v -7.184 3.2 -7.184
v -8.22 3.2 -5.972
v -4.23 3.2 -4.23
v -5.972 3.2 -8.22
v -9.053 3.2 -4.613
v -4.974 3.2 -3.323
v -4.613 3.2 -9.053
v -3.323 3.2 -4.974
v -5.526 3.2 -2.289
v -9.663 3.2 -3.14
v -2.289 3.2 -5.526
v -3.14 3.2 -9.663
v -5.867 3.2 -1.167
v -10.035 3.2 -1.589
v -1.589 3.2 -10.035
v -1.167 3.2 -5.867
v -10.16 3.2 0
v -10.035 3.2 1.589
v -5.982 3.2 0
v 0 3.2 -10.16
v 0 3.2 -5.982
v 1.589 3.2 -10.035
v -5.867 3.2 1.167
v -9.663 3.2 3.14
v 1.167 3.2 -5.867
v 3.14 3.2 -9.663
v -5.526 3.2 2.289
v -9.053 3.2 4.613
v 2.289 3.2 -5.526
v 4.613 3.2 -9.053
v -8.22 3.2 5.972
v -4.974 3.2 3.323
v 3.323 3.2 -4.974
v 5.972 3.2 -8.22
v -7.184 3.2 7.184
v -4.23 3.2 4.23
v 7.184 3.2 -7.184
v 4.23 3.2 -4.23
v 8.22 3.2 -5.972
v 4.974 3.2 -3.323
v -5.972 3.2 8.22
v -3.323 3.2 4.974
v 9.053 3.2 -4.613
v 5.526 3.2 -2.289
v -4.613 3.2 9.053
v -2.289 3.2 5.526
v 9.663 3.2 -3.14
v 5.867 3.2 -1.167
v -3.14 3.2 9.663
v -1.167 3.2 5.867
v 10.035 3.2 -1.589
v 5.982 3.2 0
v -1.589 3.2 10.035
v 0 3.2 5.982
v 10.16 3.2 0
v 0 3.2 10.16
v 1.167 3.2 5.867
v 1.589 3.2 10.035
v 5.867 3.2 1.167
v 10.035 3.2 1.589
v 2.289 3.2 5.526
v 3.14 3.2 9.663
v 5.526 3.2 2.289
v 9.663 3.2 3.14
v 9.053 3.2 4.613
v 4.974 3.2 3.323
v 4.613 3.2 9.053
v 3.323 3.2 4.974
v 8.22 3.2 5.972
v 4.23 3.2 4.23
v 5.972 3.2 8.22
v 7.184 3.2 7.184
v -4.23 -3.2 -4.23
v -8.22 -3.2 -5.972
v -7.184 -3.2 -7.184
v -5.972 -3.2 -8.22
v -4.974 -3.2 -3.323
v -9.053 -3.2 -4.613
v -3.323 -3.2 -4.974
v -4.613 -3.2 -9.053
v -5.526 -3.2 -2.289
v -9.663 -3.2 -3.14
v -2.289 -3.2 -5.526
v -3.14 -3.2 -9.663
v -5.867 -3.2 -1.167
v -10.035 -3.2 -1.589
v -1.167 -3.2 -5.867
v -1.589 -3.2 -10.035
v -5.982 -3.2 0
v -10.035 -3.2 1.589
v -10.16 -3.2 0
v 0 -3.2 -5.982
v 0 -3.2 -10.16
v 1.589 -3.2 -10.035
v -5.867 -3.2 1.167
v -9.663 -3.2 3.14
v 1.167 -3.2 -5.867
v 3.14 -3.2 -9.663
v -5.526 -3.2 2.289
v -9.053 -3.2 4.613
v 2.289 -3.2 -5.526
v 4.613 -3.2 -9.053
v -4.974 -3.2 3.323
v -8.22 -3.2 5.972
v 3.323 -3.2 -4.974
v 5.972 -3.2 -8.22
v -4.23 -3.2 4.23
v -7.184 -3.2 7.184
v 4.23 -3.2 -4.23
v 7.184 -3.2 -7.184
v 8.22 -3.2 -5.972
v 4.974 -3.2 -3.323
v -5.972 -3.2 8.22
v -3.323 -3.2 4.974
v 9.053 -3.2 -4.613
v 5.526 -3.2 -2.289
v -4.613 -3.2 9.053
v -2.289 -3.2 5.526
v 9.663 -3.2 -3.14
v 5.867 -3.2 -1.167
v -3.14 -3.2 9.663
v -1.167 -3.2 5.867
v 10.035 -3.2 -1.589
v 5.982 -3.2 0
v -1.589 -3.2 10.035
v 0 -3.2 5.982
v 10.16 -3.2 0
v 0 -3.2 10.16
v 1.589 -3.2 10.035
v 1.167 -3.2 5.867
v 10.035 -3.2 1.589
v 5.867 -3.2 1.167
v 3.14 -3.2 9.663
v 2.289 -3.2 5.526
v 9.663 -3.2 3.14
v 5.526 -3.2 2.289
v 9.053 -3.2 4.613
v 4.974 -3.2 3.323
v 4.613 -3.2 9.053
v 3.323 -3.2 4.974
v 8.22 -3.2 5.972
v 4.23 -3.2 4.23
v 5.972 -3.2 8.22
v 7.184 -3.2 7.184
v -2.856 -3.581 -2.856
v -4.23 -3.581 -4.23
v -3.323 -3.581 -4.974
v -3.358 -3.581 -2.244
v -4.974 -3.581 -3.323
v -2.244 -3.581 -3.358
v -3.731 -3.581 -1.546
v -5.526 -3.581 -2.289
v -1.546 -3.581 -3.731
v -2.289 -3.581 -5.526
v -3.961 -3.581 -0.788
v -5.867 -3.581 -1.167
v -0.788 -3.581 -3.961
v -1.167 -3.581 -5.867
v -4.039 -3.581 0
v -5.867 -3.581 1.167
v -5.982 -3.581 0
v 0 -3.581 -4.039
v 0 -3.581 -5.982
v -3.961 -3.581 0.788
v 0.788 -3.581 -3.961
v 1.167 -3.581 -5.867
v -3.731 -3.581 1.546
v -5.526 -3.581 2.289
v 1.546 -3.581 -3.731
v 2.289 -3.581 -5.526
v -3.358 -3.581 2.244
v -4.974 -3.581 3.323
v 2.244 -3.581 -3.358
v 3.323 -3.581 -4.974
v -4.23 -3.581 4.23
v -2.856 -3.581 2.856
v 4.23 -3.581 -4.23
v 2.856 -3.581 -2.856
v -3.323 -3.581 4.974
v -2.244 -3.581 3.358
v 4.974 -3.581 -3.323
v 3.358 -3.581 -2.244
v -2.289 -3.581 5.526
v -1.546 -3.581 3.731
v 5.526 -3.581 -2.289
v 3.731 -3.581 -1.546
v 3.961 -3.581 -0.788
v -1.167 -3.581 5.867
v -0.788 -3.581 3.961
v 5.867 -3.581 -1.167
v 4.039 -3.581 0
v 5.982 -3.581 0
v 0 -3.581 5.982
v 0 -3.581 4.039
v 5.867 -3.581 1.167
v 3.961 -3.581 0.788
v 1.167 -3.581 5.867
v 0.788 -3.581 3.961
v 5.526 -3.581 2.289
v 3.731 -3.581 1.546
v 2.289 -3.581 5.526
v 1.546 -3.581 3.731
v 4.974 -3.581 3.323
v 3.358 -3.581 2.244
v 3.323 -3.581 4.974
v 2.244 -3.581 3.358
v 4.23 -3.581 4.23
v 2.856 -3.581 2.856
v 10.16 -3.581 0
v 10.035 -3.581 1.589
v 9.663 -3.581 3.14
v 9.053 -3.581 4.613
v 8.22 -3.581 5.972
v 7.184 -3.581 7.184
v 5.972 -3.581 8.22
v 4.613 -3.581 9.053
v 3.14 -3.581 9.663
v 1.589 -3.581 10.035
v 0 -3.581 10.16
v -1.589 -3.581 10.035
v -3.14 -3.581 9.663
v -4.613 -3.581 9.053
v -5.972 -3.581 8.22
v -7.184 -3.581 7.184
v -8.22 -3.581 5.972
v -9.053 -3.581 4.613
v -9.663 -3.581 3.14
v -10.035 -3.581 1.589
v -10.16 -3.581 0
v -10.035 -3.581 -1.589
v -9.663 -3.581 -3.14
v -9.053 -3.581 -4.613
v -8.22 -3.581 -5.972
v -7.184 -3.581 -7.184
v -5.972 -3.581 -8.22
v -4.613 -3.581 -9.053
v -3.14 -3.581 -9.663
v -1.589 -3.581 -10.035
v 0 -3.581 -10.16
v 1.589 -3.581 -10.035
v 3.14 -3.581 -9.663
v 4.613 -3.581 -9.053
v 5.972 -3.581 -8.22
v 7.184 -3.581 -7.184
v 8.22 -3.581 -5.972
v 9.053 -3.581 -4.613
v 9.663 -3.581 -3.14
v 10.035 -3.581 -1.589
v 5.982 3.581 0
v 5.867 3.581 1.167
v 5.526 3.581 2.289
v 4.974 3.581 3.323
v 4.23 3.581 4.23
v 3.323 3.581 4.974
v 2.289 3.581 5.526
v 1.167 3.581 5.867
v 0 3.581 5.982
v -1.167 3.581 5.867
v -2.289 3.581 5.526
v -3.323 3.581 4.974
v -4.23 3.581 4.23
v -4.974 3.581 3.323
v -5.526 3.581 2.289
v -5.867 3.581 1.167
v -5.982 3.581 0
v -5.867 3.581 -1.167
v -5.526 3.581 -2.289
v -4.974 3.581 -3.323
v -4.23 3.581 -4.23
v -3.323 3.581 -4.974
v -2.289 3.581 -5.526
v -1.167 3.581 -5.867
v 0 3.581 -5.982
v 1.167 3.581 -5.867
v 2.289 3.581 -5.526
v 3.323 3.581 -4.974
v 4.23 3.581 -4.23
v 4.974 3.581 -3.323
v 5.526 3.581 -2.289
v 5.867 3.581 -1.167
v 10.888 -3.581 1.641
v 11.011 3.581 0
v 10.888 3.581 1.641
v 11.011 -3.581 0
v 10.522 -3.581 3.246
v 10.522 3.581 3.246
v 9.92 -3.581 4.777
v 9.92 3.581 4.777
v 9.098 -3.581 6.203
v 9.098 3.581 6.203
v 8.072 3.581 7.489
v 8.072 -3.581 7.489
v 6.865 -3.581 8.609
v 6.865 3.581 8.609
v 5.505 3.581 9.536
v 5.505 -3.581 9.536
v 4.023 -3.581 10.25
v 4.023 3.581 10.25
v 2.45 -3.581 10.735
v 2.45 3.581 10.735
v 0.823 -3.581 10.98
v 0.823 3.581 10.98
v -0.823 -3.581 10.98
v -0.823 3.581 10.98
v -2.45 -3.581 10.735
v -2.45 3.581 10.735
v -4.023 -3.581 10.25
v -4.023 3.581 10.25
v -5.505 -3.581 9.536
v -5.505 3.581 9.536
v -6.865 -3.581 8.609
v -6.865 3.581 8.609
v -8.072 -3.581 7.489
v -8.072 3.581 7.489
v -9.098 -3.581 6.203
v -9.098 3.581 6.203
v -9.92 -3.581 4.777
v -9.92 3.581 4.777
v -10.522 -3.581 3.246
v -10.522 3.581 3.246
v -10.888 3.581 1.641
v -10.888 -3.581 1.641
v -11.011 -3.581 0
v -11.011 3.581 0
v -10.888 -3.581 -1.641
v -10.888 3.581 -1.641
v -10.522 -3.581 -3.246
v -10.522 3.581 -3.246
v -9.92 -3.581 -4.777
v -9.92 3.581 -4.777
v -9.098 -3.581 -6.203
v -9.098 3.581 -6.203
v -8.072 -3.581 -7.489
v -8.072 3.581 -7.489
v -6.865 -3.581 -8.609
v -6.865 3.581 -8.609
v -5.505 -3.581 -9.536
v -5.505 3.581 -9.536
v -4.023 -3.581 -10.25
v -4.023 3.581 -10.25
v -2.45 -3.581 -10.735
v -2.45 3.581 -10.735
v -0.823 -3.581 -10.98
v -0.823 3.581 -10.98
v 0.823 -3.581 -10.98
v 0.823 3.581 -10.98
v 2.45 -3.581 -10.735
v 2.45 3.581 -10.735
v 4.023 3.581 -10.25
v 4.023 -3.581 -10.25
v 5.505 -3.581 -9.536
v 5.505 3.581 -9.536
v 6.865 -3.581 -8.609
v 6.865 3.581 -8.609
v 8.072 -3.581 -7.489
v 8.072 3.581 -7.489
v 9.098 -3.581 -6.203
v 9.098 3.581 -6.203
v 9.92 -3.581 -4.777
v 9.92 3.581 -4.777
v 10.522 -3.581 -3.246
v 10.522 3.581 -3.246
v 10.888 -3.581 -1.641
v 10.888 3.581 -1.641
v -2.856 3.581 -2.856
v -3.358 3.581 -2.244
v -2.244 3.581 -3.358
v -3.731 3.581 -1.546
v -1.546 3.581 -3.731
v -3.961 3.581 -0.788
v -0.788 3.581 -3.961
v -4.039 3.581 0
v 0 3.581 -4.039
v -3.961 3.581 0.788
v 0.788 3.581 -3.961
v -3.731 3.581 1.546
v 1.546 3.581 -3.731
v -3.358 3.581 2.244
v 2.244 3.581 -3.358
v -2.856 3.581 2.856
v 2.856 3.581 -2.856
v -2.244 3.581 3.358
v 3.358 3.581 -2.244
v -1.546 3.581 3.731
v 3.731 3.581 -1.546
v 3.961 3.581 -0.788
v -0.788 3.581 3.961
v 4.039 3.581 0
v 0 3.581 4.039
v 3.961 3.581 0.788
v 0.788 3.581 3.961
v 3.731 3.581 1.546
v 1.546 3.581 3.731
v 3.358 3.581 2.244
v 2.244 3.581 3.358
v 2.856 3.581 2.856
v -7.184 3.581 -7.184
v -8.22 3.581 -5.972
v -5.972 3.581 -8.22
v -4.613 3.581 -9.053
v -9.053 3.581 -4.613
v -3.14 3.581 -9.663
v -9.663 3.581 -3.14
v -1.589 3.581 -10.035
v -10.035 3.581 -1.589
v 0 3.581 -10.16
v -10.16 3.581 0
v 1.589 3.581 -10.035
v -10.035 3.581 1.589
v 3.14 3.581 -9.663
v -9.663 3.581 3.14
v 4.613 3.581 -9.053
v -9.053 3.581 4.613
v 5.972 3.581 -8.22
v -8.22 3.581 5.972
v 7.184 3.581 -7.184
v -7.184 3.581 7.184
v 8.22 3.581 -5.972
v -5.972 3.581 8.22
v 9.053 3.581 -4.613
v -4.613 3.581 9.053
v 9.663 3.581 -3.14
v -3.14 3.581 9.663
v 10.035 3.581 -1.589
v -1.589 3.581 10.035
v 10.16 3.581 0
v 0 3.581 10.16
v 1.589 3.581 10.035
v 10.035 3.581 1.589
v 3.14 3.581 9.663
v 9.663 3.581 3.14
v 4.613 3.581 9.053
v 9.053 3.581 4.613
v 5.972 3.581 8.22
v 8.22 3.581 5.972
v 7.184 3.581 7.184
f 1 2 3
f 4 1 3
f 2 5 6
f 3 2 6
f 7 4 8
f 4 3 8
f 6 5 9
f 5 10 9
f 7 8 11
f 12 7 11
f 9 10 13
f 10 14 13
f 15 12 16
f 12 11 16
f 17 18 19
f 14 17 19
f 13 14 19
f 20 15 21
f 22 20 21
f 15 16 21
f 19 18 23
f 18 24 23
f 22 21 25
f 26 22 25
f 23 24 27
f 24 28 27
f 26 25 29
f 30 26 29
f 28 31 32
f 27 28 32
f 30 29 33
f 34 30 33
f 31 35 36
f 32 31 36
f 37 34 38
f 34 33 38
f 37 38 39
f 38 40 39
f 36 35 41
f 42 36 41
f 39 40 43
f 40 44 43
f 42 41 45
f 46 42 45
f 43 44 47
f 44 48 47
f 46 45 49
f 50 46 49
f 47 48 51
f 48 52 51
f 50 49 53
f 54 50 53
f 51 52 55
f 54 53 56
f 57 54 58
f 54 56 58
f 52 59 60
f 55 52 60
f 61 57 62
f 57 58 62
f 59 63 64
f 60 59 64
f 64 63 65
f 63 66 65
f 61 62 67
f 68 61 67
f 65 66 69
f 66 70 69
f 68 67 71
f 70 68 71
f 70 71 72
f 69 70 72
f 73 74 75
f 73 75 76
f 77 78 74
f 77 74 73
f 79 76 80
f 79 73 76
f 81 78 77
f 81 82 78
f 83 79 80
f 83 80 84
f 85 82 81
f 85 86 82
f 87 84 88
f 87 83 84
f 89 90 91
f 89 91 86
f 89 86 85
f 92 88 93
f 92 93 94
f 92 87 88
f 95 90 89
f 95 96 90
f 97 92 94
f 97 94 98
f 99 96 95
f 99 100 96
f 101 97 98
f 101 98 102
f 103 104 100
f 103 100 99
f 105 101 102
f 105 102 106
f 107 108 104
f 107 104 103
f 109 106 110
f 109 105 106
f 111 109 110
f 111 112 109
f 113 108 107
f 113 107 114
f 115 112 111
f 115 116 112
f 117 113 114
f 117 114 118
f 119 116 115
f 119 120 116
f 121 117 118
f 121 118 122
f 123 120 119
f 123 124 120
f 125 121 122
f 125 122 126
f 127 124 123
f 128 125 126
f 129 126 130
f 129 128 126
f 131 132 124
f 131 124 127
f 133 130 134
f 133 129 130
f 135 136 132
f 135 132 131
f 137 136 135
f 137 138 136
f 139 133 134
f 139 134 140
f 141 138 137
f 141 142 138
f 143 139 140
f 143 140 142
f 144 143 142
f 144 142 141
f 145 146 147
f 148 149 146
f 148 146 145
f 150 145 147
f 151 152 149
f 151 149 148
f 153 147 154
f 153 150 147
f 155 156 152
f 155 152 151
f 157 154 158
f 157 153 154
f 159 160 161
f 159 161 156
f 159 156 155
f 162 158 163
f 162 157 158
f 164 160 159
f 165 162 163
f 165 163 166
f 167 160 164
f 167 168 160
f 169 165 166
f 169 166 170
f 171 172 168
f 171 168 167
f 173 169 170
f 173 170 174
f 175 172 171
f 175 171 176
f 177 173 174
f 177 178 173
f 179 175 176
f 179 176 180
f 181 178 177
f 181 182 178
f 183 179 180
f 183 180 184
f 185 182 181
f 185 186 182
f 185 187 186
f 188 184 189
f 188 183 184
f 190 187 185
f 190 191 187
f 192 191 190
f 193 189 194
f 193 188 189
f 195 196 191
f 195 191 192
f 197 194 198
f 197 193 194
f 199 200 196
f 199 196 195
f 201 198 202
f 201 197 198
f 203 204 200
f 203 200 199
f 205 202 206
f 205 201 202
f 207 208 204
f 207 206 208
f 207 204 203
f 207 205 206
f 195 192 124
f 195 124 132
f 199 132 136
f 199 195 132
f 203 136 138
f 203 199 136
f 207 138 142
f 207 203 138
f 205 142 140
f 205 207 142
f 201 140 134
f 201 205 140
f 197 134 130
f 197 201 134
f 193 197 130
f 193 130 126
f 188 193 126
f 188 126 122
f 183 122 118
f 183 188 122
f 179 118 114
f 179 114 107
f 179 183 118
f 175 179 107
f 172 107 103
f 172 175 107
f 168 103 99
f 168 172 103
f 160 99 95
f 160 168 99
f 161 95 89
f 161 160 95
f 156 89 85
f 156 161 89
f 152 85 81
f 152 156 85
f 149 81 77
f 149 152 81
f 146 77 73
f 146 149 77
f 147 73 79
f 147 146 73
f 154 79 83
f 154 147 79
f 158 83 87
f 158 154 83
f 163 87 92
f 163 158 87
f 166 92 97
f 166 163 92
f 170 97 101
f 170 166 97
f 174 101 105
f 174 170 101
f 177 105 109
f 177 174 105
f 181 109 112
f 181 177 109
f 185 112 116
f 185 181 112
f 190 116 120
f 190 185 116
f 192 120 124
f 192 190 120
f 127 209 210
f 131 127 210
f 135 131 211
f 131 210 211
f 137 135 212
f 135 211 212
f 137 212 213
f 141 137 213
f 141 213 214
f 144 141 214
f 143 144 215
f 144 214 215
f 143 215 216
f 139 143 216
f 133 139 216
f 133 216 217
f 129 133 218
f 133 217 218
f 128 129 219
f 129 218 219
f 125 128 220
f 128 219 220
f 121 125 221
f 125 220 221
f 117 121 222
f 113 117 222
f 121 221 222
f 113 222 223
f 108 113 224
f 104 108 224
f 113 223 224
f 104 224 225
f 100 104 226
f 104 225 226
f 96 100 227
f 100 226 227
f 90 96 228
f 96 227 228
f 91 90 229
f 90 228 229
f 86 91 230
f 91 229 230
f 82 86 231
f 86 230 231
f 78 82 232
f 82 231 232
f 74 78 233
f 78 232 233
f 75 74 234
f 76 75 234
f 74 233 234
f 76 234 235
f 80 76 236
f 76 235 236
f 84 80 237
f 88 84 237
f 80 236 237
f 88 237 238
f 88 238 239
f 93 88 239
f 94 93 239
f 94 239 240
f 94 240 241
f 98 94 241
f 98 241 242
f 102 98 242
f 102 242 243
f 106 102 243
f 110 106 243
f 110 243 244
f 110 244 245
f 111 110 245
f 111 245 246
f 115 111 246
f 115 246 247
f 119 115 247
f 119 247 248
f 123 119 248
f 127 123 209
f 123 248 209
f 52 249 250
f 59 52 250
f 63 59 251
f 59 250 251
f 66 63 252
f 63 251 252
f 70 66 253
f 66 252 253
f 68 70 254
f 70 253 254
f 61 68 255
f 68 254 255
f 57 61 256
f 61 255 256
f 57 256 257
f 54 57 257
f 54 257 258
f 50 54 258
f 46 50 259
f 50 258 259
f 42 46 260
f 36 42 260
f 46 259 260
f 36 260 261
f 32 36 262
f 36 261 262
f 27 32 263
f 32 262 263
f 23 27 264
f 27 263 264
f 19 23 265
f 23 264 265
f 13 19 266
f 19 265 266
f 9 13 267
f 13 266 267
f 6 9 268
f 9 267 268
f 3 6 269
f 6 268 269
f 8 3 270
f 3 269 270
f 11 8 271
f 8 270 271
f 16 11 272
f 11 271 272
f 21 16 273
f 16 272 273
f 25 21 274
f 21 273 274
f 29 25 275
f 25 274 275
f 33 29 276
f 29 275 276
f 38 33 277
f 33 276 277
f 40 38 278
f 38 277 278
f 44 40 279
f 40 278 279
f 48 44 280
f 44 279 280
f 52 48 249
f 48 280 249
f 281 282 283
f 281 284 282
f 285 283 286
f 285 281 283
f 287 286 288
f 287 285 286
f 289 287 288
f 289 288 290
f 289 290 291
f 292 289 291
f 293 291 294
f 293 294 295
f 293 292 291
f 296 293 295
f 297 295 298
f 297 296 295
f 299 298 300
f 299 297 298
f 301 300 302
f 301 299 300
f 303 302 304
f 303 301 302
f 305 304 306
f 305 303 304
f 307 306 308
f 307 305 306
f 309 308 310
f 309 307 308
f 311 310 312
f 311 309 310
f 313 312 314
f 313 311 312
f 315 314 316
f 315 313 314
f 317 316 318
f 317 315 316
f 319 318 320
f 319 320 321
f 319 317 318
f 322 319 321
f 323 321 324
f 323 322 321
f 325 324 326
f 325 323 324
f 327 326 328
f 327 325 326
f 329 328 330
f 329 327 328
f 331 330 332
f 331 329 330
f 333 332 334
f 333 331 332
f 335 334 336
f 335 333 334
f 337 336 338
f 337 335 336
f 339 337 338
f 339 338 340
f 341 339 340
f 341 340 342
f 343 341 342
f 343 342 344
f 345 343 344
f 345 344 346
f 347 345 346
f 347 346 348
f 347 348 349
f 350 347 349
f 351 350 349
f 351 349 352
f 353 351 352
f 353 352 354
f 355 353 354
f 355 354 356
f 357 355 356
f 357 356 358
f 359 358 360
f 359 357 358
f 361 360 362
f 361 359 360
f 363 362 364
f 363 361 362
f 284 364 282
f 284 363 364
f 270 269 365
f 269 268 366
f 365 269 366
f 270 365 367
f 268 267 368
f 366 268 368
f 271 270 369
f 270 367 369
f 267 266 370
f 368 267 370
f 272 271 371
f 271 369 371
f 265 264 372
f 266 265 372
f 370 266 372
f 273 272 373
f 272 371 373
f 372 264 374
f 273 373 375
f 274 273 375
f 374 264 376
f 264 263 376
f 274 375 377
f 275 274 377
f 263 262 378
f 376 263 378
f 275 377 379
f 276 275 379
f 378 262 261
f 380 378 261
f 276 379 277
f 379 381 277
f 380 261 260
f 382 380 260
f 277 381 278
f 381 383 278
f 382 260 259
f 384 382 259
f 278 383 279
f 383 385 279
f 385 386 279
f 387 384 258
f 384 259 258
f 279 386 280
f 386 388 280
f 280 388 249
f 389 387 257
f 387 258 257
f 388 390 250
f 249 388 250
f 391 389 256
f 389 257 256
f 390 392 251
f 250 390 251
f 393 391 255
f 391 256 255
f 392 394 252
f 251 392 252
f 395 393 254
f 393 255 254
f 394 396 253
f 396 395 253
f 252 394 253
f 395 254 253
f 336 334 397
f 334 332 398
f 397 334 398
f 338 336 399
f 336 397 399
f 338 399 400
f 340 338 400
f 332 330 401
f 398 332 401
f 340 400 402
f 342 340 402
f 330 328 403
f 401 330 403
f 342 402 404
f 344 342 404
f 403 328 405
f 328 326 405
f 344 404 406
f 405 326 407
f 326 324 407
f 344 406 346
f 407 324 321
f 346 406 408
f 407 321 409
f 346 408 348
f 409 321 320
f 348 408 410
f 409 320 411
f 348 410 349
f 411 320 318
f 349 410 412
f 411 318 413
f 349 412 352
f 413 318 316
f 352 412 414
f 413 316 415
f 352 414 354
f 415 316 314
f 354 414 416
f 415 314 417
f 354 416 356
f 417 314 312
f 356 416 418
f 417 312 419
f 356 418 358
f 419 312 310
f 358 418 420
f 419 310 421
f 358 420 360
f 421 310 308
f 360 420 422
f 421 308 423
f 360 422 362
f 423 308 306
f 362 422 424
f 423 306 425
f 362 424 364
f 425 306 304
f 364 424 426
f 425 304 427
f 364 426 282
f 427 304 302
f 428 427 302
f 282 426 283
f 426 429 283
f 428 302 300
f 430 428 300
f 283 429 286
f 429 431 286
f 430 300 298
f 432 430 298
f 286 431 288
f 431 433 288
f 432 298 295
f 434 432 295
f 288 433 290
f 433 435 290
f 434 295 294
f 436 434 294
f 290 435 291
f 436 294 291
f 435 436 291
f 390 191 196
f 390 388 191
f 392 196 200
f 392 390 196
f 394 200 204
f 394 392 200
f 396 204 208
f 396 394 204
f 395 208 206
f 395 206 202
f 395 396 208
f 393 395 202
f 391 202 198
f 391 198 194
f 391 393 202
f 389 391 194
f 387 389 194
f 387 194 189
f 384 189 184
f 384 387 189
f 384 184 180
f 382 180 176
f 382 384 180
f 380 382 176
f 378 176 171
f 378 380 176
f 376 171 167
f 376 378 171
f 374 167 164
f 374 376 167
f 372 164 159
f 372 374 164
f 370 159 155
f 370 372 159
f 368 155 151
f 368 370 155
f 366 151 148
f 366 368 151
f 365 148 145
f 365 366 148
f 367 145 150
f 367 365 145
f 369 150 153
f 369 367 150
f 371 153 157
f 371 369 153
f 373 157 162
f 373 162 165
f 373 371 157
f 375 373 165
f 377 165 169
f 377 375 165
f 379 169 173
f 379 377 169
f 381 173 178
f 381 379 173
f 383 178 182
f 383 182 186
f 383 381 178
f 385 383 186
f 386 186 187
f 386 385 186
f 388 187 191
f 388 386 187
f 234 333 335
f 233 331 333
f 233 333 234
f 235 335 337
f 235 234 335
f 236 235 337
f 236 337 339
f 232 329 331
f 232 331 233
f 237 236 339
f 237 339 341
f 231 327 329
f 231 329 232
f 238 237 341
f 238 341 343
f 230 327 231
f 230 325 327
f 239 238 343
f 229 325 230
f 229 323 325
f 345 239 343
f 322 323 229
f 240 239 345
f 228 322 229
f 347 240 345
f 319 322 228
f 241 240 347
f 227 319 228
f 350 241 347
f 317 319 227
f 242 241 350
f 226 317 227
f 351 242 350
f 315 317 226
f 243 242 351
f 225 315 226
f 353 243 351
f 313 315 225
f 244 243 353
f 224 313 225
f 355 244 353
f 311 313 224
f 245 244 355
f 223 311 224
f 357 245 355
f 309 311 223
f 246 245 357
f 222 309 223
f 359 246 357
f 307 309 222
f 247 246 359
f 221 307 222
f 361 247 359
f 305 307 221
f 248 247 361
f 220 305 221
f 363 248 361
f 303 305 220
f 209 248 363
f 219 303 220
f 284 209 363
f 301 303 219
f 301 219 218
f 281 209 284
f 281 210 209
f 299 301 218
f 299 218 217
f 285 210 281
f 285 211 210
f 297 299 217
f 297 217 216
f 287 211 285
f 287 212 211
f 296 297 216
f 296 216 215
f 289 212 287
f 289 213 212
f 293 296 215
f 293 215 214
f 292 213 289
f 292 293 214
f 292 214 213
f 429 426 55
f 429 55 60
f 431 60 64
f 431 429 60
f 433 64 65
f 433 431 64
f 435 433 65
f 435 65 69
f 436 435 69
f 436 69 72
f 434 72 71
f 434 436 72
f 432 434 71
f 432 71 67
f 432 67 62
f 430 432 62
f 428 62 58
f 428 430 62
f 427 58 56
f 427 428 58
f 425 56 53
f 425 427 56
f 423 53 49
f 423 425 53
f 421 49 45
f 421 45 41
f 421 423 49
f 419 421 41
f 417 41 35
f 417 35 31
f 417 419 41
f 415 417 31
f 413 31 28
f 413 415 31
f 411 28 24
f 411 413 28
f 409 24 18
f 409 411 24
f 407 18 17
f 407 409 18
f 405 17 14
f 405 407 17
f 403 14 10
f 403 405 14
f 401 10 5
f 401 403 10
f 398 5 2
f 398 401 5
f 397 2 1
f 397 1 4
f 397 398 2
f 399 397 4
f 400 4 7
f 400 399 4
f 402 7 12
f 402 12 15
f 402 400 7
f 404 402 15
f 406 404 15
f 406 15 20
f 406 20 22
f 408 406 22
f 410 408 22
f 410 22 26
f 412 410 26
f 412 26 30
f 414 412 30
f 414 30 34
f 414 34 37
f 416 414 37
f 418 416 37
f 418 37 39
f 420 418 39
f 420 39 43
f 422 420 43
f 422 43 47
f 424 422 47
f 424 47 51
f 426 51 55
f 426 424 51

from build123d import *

# Parameters (mm, degrees)
F0_R     = 11.0109
F0_R_2   = 5.969
F1_DEPTH = 3.5814
F2_R     = 10.16
F2_R_2   = 5.9817
F3_DEPTH = 0.381
F4_R     = 5.969
F4_R_2   = 4.0386
F5_DEPTH = 3.5814


# Not quite as in the source:
# - a pattern or mirror of a feature is missing from the dataset's text; its kind, count and spacing are read off the source's solid


with BuildPart() as f1:
    # F0 (on Front) → F1 (new body, symmetric)
    with BuildSketch(Plane.XZ):
        Circle(F0_R)
        Circle(F0_R_2, mode=Mode.SUBTRACT)
    extrude(amount=F1_DEPTH, both=True)

    # F2 (on face) → F3 (cut)
    with BuildSketch(Plane.XZ.offset(3.5814)):
        Circle(F2_R)
        Circle(F2_R_2, mode=Mode.SUBTRACT)
    f3 = extrude(amount=-F3_DEPTH, mode=Mode.SUBTRACT)

    # F3_copies: F3 across plane
    add(f3.mirror(Plane.ZX), mode=Mode.SUBTRACT)

    # F4 (on Front) → F5 (join, symmetric)
    with BuildSketch(Plane.XZ):
        Circle(F4_R)
        Circle(F4_R_2, mode=Mode.SUBTRACT)
    extrude(amount=F5_DEPTH, both=True)


solid = f1.part
